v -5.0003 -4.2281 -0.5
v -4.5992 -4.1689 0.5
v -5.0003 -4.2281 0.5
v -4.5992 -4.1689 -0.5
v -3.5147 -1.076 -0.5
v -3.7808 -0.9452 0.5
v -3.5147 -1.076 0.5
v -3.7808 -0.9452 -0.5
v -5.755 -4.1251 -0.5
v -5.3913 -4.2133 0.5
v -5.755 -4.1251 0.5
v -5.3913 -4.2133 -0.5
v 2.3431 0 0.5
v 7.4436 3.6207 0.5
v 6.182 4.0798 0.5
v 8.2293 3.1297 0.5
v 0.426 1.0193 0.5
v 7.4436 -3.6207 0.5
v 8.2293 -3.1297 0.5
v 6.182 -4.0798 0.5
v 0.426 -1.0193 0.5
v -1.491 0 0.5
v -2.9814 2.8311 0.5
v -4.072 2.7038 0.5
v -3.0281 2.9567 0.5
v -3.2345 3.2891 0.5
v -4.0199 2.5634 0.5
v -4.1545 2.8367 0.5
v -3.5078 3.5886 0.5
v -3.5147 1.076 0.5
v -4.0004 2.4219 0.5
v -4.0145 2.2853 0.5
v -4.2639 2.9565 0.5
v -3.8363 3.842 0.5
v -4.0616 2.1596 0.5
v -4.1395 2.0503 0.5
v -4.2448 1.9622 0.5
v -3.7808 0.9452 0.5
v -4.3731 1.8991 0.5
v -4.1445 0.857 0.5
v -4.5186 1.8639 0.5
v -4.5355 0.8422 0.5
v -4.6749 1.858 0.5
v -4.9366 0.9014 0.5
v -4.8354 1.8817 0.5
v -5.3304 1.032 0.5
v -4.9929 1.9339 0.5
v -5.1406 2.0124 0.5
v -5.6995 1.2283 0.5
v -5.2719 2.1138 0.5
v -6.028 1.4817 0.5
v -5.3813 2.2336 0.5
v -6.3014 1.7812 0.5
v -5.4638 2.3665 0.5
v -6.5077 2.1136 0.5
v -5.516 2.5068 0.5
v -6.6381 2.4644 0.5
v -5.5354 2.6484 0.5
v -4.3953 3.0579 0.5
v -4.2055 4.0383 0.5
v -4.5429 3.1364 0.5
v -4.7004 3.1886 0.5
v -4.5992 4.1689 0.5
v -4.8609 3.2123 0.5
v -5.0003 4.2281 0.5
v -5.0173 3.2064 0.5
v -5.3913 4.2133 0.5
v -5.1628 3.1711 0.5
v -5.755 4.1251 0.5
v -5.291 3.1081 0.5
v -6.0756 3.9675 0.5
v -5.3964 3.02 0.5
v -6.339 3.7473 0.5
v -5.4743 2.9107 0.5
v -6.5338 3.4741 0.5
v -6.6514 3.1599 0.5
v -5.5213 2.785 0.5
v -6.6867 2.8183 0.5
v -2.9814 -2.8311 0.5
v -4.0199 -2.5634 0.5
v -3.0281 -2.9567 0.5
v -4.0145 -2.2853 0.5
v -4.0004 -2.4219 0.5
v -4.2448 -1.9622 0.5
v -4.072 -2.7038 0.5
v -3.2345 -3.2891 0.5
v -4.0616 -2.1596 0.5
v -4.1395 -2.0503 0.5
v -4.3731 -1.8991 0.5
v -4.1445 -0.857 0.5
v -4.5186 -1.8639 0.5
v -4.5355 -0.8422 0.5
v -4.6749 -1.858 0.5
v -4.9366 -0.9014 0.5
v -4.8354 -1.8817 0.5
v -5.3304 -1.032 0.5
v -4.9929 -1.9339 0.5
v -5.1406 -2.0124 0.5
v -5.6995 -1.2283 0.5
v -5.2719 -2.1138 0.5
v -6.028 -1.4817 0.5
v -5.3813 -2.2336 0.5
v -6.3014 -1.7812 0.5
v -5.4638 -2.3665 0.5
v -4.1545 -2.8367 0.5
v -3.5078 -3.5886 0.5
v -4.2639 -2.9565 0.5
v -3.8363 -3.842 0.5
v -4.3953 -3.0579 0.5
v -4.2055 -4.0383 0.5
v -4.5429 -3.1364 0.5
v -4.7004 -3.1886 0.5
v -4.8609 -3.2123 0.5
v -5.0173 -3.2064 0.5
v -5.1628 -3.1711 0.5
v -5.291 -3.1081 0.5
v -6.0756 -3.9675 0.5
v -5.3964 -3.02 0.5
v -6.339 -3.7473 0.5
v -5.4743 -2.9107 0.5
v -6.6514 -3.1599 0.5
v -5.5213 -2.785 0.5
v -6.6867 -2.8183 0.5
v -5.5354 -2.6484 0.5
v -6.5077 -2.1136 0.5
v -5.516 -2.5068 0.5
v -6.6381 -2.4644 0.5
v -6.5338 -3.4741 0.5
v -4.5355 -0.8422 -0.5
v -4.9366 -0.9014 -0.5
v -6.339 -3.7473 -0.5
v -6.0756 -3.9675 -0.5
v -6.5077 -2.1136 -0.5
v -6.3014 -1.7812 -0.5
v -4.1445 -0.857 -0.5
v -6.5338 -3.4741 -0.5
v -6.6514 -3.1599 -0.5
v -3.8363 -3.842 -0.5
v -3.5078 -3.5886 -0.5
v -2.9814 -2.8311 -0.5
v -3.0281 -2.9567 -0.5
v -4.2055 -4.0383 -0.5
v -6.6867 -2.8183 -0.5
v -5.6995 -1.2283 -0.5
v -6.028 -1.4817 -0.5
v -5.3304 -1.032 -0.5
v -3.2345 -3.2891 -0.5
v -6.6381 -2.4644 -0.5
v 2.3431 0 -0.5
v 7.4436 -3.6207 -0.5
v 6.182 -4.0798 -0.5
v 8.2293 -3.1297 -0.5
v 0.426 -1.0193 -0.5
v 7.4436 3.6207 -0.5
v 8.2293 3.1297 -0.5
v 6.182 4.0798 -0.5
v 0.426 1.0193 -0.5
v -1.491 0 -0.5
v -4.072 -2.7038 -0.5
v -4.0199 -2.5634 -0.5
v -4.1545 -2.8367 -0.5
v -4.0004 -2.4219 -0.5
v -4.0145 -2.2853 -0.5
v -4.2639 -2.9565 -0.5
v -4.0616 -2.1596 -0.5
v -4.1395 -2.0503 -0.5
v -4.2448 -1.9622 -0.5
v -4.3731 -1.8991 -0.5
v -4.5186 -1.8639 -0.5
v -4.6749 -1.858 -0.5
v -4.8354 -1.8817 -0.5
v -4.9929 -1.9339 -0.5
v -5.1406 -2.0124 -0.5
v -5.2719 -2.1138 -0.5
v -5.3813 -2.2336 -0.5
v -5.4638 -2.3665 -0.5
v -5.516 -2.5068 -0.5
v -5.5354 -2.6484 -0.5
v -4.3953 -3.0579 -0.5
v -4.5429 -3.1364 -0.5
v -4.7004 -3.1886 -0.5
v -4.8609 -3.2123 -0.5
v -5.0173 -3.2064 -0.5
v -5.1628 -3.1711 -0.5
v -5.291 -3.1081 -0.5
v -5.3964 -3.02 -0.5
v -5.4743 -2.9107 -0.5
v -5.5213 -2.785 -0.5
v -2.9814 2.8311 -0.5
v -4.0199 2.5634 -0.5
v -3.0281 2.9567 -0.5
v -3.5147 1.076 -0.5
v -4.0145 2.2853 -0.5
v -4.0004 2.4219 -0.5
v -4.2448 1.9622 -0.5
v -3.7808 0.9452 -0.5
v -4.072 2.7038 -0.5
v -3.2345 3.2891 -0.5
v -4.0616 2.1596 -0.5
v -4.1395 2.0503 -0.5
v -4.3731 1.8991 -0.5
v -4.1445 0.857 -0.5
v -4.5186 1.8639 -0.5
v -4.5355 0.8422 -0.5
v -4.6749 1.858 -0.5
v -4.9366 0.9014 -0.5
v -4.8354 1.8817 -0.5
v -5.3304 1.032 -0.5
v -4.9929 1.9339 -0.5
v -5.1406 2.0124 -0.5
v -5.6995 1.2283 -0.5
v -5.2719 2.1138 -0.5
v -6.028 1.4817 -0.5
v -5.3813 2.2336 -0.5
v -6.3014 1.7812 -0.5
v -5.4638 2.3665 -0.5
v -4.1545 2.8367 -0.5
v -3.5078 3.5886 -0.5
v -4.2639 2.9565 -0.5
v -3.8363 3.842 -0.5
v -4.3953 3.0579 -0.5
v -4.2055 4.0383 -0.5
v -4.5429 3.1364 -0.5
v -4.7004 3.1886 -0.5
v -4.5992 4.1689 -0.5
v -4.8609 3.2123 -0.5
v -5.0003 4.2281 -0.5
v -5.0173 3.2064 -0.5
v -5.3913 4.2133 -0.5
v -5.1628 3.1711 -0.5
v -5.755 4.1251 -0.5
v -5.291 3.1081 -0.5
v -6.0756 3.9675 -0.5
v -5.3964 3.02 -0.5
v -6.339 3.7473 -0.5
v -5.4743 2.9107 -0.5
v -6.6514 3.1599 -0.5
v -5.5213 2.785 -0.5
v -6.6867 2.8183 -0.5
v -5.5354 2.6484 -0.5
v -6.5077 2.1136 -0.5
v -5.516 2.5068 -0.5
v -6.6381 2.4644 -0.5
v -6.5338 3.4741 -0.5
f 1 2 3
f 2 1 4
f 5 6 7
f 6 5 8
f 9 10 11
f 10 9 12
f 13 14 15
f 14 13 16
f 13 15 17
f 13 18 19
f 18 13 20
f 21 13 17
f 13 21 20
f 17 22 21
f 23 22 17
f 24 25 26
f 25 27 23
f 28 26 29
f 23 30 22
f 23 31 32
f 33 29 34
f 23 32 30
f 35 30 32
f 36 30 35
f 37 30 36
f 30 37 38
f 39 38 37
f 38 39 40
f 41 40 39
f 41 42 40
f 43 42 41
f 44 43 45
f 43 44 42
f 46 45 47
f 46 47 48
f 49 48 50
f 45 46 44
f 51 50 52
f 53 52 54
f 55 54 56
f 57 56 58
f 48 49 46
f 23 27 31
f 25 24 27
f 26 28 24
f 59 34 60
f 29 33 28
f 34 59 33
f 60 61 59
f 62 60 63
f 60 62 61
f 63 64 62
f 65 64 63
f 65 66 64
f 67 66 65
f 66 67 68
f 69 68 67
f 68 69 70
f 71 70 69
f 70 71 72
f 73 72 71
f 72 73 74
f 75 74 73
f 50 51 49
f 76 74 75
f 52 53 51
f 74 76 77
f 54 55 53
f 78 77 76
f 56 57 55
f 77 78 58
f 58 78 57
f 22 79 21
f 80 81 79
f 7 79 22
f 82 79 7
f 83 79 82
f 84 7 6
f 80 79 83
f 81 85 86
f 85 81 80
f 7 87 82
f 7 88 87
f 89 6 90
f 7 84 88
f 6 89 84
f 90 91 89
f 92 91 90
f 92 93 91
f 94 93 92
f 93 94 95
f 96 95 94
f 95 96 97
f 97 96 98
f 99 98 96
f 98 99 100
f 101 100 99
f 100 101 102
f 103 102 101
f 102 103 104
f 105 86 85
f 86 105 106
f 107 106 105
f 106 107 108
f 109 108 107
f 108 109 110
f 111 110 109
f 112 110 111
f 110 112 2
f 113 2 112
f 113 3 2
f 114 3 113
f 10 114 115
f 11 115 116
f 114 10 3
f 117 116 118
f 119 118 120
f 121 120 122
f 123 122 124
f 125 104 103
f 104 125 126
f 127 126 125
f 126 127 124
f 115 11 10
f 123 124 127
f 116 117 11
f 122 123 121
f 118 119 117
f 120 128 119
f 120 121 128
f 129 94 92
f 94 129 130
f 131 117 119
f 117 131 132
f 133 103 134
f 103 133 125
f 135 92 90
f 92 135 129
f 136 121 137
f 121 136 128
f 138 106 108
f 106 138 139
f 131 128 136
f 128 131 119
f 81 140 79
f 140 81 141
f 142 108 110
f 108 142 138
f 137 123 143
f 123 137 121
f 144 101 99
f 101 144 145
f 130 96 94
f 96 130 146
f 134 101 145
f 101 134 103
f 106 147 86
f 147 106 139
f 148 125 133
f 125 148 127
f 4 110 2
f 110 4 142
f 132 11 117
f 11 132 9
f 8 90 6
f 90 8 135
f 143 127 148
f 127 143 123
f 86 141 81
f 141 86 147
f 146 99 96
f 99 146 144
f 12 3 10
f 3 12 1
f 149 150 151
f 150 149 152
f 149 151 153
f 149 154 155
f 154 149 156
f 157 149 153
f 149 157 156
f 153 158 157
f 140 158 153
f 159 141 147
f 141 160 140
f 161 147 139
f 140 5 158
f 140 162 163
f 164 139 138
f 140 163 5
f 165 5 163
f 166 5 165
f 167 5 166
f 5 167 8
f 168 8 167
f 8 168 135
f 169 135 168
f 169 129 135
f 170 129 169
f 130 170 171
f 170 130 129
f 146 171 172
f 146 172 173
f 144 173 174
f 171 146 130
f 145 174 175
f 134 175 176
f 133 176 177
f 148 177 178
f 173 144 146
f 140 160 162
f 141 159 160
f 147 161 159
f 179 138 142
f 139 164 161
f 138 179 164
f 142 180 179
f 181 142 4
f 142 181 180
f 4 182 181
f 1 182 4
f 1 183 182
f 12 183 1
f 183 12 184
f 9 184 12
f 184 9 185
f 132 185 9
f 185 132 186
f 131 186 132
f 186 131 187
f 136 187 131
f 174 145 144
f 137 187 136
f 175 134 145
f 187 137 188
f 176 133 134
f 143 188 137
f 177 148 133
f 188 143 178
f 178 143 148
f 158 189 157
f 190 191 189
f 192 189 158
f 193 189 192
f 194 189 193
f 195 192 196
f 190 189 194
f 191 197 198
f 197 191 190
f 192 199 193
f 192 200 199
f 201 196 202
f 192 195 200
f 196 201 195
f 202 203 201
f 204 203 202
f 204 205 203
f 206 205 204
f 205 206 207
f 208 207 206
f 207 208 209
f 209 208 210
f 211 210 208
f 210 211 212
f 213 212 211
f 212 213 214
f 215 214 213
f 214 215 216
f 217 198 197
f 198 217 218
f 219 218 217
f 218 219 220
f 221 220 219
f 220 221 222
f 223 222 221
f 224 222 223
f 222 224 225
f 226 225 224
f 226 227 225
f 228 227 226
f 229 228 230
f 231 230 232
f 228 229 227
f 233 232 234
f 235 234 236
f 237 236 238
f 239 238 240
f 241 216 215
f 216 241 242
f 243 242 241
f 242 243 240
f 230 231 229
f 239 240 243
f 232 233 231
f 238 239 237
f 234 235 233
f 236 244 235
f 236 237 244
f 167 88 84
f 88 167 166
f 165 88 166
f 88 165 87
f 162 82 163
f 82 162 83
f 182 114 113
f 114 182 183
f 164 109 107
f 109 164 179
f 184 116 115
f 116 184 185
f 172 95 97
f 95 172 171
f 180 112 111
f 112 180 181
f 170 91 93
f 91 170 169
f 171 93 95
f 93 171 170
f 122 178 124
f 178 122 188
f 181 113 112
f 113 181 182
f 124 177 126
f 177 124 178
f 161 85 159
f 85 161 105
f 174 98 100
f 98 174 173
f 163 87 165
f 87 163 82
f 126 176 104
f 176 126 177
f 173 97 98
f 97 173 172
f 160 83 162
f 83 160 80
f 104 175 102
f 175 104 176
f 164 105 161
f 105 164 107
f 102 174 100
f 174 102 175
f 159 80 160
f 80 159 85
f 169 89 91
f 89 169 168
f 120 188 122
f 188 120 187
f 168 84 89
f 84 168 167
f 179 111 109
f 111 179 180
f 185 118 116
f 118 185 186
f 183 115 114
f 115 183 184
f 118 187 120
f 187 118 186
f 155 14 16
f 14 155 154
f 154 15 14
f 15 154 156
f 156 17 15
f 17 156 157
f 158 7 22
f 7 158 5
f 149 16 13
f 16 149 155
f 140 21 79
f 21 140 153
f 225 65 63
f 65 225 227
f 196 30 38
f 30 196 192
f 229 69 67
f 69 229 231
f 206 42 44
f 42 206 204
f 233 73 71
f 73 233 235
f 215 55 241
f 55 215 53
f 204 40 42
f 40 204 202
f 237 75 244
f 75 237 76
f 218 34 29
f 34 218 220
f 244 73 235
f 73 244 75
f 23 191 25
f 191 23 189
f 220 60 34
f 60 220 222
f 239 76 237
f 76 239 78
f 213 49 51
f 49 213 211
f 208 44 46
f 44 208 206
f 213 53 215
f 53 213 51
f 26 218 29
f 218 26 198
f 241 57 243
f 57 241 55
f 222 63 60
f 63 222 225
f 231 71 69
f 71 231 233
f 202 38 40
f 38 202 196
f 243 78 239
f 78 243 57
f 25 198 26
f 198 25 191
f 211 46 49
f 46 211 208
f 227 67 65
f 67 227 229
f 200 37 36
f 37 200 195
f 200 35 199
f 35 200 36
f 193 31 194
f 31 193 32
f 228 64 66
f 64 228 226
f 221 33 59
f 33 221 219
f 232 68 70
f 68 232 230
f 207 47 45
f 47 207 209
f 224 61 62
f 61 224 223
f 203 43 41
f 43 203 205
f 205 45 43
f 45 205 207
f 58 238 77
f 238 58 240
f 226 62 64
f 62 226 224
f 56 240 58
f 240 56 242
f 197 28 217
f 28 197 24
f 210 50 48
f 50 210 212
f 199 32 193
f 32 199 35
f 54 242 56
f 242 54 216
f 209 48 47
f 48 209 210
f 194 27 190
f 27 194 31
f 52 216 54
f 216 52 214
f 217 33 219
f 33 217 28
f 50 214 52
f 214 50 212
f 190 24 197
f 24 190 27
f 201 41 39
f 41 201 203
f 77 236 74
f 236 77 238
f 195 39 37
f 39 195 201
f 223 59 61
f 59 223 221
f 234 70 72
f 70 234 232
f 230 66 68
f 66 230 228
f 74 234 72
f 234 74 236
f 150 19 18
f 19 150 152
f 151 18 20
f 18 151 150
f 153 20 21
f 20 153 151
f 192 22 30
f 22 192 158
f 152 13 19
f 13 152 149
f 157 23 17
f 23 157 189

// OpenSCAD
//=============================================================================
// Icon used for the Cut operation. Scissors, of course.
//=============================================================================

module Handle() {
  scale([1, .8, 1]) {
    difference() {
      cylinder(r =  2,  h = 1, center = true);
      cylinder(r = .8, h = 2, center = true);
    }
  }
}


module Blade() {
  translate([-2.4, -5, 0]) scale([1, 1, 1]) {
    intersection() {
      cylinder(r = 8, h = 1, center = true);
      translate([0, 4.8, 0]) cube([20, 1.8, 4], center = true);
    }
  }
}

module Side() {
  rotate([0, 0, 28]) translate([-5.4, 0, 0]) {
    Handle();
    translate([9.6, 0, 0]) Blade();
  }
}

module Scissors() {
  union() {
    Side();
    mirror([0, 1, 0]) Side();
  }
}

module CutIcon() {
  Scissors();
}

$fn = 30;
CutIcon();
